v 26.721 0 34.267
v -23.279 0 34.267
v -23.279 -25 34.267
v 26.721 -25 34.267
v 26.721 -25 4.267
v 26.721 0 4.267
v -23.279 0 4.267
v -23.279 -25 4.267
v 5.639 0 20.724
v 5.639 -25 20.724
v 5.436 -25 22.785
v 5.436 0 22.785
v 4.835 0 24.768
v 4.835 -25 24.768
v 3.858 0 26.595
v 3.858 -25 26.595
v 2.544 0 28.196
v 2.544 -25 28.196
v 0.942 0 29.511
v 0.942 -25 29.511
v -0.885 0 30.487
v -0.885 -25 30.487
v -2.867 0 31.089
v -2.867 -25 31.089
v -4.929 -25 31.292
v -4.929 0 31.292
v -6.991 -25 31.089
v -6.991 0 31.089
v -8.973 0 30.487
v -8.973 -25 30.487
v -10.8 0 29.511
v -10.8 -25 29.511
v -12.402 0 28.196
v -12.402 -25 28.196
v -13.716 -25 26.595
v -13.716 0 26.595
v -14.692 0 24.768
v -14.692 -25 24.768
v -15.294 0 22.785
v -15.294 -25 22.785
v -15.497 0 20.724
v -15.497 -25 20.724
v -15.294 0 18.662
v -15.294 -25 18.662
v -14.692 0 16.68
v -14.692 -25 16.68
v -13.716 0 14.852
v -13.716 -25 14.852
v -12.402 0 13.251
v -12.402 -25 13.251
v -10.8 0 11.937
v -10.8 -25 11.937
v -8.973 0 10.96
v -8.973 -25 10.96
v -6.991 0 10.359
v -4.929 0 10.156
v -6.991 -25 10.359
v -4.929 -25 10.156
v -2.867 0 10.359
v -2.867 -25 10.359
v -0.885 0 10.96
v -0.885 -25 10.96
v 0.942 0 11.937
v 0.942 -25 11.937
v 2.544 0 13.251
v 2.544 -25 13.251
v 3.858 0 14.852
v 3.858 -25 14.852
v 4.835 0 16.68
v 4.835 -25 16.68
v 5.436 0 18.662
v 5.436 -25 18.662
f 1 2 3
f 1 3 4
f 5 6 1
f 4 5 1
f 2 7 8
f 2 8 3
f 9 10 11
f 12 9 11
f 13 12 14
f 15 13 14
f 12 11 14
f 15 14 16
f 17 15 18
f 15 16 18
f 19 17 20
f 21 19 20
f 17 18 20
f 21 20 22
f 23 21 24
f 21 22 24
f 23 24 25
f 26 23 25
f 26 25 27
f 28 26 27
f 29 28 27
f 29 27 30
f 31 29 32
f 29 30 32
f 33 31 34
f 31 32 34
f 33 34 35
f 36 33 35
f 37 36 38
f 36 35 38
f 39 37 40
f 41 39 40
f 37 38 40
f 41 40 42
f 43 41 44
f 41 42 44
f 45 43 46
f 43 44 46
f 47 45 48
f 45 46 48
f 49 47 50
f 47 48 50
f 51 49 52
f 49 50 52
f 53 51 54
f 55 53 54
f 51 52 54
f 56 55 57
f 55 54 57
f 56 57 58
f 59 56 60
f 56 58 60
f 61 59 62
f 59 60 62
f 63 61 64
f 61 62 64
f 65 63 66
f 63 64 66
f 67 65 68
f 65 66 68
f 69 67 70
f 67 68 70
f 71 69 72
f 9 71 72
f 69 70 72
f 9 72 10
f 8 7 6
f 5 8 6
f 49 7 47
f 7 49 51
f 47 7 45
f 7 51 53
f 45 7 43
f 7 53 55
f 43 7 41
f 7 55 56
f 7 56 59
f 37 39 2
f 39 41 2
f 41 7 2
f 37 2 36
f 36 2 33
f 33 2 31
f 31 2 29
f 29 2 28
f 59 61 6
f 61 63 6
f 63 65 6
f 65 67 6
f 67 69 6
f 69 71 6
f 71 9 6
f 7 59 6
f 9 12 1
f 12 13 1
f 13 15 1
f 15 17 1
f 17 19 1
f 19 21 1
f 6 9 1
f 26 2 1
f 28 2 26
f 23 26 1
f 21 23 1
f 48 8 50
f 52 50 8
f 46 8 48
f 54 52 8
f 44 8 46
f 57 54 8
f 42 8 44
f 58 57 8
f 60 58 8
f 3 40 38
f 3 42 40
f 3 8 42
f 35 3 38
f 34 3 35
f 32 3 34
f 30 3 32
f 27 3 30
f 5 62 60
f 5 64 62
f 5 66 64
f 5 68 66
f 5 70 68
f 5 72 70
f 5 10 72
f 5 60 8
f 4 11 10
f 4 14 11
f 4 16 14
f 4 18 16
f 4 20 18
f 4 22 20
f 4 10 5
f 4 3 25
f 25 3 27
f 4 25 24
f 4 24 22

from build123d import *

# Parameters (mm, degrees)
F0_W     = 50
F0_H     = 30
F1_DEPTH = 25
F2_R     = 10.5679387912
F3_DEPTH = 25


# Not quite as in the source:
# - a feature of the source that left no trace in its solid (it failed there, or was rolled back) is left out


with BuildPart() as f1:
    # F0 (on Front) → F1 (new body)
    with BuildSketch(Plane.XZ):
        with Locations((1.7205976233, 19.2674261052)):
            Rectangle(F0_W, F0_H)
    extrude(amount=F1_DEPTH)

    # F2 (on face) → F3 (cut)
    with BuildSketch(Plane.XZ.offset(25)):
        with Locations((-4.9288761802, 20.7236856222)):
            Circle(F2_R)
    extrude(amount=-F3_DEPTH, mode=Mode.SUBTRACT)


solid = f1.part
